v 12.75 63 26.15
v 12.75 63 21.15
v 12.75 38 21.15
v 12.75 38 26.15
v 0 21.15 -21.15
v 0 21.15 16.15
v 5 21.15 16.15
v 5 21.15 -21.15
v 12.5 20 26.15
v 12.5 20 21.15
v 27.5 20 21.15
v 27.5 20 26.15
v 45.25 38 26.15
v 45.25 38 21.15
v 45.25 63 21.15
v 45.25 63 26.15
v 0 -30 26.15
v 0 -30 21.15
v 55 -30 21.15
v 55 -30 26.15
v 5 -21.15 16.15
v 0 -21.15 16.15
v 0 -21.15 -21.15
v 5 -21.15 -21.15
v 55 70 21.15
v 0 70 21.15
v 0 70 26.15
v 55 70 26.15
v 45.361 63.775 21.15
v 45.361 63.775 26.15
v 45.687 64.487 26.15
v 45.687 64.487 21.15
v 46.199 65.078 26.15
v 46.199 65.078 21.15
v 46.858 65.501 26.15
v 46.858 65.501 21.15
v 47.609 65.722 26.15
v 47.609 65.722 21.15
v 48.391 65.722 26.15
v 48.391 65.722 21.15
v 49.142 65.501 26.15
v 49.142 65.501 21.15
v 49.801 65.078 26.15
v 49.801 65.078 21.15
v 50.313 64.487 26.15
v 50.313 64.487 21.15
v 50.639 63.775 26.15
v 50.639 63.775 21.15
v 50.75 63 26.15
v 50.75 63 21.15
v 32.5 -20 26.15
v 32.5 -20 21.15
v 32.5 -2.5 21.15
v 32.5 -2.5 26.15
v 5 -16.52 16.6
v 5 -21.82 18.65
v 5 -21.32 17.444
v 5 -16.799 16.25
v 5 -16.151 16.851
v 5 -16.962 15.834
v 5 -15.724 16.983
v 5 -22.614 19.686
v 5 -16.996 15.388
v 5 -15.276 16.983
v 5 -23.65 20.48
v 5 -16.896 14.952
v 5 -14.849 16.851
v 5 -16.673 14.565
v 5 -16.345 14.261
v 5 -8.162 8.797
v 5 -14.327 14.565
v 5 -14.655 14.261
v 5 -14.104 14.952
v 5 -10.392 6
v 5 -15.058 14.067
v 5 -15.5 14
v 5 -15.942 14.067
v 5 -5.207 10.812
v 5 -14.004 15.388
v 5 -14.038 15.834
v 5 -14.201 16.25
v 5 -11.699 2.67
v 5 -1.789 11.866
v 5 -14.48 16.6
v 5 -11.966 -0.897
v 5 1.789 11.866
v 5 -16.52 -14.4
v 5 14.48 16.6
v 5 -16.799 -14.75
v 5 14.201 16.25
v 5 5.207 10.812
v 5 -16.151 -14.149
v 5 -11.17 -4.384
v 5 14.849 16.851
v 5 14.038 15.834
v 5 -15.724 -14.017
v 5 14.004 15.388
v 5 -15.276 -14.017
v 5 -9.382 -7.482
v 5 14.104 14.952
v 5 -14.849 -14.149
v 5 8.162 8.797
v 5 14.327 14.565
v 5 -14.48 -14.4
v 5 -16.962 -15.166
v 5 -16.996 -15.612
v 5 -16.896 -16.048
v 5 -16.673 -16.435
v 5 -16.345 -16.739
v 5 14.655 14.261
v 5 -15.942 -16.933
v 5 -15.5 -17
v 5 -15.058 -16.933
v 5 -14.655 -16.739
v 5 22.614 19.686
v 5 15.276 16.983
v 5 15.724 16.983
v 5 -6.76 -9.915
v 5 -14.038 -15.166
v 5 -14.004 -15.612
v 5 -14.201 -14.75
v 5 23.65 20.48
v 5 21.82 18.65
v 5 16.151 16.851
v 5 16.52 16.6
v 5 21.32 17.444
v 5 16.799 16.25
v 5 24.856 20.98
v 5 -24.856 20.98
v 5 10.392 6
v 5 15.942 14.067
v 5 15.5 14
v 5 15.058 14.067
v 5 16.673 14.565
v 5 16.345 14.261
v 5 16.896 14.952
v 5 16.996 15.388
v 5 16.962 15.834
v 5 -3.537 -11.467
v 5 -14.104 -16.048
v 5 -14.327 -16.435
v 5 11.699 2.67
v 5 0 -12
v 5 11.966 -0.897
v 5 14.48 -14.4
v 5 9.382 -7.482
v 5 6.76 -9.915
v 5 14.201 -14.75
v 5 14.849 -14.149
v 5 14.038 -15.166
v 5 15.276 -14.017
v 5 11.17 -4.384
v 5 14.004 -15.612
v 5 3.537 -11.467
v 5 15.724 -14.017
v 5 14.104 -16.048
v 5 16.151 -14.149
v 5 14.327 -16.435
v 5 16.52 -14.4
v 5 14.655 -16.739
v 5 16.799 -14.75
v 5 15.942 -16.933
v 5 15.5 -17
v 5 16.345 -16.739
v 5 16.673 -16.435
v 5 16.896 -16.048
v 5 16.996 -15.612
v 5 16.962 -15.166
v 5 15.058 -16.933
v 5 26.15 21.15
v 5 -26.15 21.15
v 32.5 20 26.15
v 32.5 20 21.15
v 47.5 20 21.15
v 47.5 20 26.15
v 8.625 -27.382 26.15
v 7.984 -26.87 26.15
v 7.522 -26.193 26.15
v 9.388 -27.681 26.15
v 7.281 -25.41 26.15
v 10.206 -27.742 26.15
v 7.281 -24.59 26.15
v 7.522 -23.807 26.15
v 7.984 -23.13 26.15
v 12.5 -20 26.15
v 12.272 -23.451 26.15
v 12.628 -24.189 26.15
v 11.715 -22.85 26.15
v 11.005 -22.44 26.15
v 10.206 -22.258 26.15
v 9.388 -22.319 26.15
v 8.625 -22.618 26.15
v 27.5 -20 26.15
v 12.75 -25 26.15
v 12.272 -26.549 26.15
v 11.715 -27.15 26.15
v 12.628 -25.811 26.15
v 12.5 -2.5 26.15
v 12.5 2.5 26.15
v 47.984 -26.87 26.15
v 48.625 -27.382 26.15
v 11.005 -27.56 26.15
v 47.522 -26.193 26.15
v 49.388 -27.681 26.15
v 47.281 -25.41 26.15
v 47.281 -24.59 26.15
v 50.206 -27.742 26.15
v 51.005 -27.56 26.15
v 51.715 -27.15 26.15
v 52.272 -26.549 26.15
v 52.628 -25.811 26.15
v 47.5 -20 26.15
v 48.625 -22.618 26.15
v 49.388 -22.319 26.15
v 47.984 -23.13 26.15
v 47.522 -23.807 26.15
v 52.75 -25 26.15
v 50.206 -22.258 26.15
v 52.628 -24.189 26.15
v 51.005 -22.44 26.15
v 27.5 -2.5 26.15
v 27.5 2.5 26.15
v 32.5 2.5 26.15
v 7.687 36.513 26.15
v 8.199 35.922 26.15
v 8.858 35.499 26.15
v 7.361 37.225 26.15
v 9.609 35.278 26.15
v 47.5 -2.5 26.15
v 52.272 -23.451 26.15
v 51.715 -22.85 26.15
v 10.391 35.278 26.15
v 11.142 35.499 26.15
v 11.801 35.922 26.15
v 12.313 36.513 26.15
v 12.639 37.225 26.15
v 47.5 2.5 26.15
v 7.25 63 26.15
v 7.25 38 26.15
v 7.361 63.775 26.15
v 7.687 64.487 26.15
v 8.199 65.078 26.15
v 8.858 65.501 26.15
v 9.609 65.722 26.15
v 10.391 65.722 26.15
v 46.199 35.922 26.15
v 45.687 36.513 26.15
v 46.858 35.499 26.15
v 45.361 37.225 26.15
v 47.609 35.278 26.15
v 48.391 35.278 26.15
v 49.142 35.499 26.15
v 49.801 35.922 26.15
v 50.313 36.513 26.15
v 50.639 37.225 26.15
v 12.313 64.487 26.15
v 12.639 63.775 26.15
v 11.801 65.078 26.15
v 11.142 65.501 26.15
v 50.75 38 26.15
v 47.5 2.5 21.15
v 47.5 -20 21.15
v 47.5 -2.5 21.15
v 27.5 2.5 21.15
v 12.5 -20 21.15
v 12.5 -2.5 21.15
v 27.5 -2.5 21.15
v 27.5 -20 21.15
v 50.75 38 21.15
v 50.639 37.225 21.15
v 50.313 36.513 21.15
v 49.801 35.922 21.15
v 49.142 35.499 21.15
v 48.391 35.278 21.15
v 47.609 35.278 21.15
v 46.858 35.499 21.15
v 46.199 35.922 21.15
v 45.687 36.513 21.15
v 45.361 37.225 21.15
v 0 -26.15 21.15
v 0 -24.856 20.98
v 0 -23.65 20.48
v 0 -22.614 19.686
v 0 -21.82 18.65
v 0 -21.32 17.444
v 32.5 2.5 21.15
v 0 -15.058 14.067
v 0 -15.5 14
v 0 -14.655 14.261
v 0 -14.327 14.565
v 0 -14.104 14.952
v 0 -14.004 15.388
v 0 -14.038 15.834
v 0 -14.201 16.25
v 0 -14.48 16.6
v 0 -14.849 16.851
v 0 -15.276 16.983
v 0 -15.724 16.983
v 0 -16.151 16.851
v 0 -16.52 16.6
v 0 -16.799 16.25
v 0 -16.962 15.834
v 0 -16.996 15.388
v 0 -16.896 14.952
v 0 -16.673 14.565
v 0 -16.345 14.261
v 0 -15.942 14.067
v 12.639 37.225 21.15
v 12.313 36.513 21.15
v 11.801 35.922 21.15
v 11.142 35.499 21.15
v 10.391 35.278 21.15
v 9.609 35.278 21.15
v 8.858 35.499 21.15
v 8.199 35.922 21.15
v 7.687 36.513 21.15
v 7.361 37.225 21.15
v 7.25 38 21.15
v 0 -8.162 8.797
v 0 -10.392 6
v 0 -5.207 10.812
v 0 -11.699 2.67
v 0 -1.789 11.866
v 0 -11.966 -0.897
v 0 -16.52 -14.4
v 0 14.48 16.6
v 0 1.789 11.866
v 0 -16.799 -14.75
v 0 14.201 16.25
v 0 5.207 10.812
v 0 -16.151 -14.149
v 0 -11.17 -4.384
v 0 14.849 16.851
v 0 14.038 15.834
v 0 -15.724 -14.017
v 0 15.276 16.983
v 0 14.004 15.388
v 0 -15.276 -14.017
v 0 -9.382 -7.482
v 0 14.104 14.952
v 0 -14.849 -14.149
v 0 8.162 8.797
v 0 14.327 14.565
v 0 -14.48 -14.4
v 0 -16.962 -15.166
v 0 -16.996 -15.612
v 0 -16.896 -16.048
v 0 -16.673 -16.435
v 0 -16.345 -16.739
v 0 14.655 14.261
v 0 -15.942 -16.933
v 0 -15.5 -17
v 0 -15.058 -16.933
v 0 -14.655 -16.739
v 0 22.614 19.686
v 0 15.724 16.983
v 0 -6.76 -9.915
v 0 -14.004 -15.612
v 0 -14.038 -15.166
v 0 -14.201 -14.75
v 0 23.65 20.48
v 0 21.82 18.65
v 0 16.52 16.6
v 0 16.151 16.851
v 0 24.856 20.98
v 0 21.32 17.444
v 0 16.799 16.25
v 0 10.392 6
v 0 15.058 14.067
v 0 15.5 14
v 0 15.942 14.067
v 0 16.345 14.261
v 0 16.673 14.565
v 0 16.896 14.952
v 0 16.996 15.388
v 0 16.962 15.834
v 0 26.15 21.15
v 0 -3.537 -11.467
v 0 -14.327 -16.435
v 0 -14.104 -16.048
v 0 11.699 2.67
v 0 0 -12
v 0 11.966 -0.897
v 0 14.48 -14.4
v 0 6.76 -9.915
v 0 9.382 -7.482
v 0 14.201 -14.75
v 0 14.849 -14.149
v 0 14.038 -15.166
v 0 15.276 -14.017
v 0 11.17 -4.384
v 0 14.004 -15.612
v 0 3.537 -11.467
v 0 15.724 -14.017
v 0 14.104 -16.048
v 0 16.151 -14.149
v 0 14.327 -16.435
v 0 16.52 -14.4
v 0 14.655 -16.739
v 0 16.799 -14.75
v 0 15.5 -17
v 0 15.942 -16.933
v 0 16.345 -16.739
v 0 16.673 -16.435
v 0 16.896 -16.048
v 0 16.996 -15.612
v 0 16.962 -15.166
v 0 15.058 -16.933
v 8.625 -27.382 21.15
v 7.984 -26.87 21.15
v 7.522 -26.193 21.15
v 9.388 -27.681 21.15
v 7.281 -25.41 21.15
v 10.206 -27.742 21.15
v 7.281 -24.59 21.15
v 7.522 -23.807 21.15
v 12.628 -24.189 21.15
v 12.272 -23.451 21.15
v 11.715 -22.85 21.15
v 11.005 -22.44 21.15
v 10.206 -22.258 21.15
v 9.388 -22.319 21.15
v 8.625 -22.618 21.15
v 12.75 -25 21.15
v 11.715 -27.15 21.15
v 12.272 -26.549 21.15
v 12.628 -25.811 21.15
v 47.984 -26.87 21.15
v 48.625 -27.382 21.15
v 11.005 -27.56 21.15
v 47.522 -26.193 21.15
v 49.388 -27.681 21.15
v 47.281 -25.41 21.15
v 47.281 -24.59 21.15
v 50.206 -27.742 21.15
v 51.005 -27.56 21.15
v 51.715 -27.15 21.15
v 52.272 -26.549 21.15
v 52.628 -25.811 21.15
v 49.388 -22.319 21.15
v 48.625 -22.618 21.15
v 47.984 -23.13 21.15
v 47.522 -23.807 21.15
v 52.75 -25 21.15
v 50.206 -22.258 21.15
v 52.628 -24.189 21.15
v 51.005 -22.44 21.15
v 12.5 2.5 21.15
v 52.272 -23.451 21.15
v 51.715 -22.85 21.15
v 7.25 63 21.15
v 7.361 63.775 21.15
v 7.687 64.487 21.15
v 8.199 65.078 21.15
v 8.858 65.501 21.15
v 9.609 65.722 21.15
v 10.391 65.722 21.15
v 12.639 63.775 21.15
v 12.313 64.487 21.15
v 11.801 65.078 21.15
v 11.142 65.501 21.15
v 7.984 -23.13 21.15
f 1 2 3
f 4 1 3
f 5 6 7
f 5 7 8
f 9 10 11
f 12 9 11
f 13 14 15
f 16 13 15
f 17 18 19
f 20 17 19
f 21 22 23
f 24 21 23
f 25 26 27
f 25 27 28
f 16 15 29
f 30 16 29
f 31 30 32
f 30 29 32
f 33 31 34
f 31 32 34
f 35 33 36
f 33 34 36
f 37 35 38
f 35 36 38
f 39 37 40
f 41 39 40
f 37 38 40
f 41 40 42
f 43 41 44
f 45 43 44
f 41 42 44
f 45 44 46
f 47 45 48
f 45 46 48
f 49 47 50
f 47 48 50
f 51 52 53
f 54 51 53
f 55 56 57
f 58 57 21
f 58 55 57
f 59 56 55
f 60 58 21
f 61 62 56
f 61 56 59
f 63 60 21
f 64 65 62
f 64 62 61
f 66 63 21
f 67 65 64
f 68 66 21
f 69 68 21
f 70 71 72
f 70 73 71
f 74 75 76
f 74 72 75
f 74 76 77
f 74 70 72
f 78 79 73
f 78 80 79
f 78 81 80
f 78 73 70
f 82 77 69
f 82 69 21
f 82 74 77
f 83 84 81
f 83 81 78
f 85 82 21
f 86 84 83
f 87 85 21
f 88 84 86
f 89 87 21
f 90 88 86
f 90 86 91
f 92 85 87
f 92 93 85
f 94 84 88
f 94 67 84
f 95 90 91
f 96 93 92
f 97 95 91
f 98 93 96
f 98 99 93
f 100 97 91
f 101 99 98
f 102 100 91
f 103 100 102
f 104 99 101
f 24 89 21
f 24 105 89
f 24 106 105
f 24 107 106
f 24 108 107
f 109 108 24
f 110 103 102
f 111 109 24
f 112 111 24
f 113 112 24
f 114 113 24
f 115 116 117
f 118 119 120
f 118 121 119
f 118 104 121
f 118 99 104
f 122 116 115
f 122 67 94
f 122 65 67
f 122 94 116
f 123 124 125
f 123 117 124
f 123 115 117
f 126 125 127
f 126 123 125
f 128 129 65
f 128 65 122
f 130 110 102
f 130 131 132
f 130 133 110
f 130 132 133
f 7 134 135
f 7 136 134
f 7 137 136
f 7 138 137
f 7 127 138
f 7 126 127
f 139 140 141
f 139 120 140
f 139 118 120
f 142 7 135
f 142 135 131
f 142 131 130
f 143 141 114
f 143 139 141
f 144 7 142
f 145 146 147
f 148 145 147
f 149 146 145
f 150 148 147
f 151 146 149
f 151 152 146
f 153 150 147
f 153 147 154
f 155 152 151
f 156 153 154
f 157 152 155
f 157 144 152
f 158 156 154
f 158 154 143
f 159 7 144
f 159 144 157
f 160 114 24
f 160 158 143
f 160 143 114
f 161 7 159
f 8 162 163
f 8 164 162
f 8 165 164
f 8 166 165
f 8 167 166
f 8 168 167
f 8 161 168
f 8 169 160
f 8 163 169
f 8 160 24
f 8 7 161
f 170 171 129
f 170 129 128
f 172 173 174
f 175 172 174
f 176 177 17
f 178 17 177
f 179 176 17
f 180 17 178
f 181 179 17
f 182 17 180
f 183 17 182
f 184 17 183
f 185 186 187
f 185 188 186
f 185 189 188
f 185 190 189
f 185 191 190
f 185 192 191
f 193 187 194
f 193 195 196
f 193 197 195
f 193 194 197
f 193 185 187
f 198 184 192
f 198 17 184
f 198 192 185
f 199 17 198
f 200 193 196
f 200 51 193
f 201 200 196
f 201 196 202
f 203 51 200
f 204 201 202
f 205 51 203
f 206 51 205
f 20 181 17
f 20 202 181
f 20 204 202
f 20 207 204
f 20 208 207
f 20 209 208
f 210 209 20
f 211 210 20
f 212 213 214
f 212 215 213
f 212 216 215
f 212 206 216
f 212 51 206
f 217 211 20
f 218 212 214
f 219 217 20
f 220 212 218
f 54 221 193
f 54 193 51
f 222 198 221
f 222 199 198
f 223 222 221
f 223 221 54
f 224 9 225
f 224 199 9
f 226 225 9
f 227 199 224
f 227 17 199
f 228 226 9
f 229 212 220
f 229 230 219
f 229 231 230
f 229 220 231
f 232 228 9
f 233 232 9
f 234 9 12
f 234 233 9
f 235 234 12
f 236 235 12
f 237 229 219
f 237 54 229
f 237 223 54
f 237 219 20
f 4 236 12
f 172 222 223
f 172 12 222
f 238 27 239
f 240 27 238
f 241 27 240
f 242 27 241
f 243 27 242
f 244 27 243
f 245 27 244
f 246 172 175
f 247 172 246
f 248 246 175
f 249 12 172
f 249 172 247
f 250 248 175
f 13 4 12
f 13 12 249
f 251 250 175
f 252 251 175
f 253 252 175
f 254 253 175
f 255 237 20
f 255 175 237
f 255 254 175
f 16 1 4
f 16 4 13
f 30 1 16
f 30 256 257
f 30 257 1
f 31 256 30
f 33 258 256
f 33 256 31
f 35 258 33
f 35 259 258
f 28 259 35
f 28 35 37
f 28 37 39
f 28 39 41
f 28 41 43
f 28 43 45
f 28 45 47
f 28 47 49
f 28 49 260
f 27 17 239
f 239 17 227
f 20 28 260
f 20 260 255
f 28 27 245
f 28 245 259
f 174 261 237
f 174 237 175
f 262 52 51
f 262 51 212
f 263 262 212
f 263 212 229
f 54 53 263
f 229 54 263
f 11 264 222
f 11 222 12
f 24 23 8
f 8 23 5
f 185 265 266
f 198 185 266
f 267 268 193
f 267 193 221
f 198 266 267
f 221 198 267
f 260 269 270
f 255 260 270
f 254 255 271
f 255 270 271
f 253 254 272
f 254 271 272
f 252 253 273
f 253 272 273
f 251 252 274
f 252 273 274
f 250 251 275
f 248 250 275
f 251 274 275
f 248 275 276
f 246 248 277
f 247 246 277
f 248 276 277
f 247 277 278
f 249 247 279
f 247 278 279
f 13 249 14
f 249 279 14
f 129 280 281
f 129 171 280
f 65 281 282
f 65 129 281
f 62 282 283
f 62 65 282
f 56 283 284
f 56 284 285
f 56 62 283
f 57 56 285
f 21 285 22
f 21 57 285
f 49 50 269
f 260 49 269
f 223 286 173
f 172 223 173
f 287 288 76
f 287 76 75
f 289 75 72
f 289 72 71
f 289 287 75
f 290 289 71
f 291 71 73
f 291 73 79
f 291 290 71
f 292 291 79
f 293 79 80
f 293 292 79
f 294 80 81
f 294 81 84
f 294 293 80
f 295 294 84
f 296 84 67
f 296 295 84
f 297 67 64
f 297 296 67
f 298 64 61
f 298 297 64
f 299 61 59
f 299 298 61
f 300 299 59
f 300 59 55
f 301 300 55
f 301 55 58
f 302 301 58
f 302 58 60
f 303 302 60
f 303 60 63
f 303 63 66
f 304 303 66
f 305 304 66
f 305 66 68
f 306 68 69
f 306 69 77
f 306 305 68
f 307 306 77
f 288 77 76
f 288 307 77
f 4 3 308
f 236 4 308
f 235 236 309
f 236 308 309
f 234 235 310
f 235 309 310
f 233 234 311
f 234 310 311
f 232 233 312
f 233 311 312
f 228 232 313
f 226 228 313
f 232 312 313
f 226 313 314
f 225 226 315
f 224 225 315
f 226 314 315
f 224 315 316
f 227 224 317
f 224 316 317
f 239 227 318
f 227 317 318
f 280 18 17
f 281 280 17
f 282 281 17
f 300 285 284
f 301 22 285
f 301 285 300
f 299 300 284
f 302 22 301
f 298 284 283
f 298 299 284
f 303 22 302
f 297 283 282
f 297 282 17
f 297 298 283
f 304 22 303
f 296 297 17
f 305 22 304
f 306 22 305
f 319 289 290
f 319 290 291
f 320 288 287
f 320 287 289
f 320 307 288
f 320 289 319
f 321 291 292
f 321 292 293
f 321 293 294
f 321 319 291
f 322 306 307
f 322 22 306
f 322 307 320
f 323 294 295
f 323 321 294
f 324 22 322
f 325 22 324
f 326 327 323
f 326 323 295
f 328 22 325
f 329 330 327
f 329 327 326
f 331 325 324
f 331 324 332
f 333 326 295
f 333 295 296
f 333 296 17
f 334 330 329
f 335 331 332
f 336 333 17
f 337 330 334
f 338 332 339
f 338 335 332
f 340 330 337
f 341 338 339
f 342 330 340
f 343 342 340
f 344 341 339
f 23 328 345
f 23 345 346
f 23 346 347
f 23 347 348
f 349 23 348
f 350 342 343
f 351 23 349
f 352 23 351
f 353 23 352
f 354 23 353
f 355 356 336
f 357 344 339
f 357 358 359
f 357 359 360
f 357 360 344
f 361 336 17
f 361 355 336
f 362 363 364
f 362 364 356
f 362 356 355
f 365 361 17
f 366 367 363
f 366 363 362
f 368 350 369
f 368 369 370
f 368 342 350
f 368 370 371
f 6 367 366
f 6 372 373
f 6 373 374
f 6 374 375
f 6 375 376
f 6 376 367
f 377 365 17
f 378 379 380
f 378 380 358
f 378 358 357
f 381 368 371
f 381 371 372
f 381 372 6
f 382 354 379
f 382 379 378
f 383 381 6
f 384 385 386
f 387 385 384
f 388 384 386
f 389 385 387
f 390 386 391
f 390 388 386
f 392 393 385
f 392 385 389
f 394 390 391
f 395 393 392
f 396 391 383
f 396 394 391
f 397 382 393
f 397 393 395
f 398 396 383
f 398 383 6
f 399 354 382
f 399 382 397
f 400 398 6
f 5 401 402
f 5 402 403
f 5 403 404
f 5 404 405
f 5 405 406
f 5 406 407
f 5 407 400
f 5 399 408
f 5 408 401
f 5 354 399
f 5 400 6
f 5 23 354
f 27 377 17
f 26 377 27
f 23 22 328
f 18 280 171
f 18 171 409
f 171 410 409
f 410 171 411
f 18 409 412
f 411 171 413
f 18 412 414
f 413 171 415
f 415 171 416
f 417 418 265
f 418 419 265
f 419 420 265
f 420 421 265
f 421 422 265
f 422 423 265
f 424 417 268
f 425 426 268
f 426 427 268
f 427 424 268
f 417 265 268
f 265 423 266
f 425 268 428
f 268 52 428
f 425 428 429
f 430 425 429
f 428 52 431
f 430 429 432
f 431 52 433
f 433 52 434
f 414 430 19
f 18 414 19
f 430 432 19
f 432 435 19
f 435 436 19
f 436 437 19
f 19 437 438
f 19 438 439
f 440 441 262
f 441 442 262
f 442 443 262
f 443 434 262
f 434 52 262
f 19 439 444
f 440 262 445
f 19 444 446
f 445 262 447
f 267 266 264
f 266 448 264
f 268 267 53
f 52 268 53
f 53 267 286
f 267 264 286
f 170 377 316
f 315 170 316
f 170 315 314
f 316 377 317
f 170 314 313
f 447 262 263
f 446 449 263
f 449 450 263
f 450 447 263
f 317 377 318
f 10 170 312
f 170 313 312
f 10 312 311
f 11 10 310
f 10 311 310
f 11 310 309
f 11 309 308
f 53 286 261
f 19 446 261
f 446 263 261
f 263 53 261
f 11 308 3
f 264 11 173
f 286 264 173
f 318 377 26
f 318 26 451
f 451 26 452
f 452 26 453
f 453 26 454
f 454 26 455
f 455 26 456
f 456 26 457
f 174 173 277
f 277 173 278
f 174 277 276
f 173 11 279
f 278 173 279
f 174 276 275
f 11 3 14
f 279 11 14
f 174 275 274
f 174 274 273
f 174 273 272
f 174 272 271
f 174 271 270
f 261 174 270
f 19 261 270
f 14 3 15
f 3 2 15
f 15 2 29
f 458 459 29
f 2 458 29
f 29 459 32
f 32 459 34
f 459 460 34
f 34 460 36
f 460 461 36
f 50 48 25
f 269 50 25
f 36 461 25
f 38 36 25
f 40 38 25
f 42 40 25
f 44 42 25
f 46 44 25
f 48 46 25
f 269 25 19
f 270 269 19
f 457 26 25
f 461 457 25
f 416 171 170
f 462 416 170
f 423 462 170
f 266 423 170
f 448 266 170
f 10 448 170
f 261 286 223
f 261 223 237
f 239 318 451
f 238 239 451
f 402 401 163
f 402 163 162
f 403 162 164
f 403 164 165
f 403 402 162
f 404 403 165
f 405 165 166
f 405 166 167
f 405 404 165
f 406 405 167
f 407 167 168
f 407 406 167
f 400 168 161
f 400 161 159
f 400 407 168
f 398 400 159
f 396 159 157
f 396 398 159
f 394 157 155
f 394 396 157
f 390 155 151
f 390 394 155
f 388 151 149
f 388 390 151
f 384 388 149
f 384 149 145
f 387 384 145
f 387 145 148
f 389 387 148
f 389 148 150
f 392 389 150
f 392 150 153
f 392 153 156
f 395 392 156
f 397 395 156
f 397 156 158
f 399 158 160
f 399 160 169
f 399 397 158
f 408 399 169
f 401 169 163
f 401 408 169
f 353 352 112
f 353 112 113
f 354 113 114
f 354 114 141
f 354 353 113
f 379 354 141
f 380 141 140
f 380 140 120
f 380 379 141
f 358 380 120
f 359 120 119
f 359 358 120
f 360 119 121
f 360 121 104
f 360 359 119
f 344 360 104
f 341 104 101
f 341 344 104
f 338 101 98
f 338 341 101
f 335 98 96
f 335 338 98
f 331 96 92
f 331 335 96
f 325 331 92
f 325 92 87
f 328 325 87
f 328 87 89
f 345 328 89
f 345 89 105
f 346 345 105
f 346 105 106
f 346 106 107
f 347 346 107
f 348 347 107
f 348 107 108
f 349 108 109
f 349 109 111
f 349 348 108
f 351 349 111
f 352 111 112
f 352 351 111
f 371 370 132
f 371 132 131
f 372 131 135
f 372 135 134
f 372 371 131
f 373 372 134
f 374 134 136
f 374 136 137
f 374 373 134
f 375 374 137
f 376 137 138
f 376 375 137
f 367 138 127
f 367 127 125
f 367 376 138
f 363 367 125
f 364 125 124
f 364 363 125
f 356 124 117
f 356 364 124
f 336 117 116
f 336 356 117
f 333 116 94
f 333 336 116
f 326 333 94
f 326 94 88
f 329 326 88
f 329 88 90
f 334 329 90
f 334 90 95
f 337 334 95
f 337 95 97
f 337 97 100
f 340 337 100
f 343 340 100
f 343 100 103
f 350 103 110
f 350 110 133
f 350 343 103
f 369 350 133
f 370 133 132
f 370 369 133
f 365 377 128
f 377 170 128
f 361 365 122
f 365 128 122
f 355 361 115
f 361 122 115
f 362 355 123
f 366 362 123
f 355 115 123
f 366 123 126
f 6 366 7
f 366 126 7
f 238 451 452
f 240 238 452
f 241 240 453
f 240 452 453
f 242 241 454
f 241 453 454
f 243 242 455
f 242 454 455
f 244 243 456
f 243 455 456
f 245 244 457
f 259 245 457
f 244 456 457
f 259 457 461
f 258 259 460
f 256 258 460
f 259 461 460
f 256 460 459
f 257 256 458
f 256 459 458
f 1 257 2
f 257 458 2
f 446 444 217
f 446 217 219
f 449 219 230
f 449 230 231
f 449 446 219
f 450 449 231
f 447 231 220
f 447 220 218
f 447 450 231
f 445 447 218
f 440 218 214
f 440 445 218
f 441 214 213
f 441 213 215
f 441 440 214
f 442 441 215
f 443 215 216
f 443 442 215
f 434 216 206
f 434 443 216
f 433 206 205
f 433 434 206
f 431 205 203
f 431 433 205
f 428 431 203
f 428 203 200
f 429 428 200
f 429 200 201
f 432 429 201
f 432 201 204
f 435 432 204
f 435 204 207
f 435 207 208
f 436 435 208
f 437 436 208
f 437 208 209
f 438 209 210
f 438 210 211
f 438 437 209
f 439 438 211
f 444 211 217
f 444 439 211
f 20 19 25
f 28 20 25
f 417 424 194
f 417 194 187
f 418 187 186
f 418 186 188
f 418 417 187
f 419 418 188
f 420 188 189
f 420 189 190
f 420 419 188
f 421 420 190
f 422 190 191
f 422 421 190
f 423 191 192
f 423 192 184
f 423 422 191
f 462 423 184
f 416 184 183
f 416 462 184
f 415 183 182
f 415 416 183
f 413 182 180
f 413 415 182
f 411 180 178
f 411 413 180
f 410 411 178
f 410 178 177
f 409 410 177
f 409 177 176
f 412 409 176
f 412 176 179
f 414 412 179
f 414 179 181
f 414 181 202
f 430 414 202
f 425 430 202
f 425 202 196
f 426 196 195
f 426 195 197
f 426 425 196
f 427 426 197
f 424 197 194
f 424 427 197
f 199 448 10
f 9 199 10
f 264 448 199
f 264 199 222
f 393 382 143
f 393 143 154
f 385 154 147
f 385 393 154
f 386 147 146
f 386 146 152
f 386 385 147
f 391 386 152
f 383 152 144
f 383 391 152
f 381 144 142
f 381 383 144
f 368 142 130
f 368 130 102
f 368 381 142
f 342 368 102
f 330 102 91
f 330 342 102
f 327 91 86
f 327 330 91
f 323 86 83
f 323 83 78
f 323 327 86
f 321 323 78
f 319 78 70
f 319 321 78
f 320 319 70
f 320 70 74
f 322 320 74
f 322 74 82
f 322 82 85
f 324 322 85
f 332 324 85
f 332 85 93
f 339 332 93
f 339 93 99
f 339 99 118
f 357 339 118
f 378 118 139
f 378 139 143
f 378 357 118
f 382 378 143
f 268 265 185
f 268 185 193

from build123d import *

# Parameters (mm, degrees)
SKETCH2_W           = 42.3
SKETCH2_H           = 42.3
SKETCH2_R           = 1.5
SKETCH2_R_2         = 12
BOSS_EXTRUDE1_DEPTH = 5
SKETCH3_W           = 55
SKETCH3_H           = 100
SKETCH3_R           = 2.75
SKETCH3_W_2         = 15
SKETCH3_H_2         = 17.5
BOSS_EXTRUDE2_DEPTH = 5
FILLET1_R           = 5


with BuildPart() as part:
    # Sketch2 → Boss-Extrude1 (new body)
    with BuildSketch(Plane(origin=(0, 0, 0), x_dir=(0, 0, -1), z_dir=(1, 0, 0))):
        Rectangle(SKETCH2_W, SKETCH2_H)
        with Locations((-15.5, 15.5)):
            Circle(SKETCH2_R, mode=Mode.SUBTRACT)
        with Locations((15.5, 15.5)):
            Circle(SKETCH2_R, mode=Mode.SUBTRACT)
        with Locations((15.5, -15.5)):
            Circle(SKETCH2_R, mode=Mode.SUBTRACT)
        with Locations((-15.5, -15.5)):
            Circle(SKETCH2_R, mode=Mode.SUBTRACT)
        Circle(SKETCH2_R_2, mode=Mode.SUBTRACT)
    extrude(amount=BOSS_EXTRUDE1_DEPTH)

    # Sketch3 → Boss-Extrude2 (add)
    with BuildSketch(Plane.XY.offset(21.15)):
        with Locations((27.5, 20)):
            Rectangle(SKETCH3_W, SKETCH3_H)
        with Locations((50, -25)):
            Circle(SKETCH3_R, mode=Mode.SUBTRACT)
        with Locations((10, -25)):
            Circle(SKETCH3_R, mode=Mode.SUBTRACT)
        with Locations((20, 11.25)):
            Rectangle(SKETCH3_W_2, SKETCH3_H_2, mode=Mode.SUBTRACT)
        with Locations((40, 11.25)):
            Rectangle(SKETCH3_W_2, SKETCH3_H_2, mode=Mode.SUBTRACT)
        with Locations((40, -11.25)):
            Rectangle(SKETCH3_W_2, SKETCH3_H_2, mode=Mode.SUBTRACT)
        with Locations((20, -11.25)):
            Rectangle(SKETCH3_W_2, SKETCH3_H_2, mode=Mode.SUBTRACT)
        with BuildLine():
            Line((50.75, 63), (50.75, 38))
            ThreePointArc((50.75, 38), (48, 35.25), (45.25, 38))
            Line((45.25, 38), (45.25, 63))
            ThreePointArc((45.25, 63), (48, 65.75), (50.75, 63))
        make_face(mode=Mode.SUBTRACT)
        with BuildLine():
            Line((12.75, 63), (12.75, 38))
            ThreePointArc((12.75, 38), (10, 35.25), (7.25, 38))
            Line((7.25, 38), (7.25, 63))
            ThreePointArc((7.25, 63), (10, 65.75), (12.75, 63))
        make_face(mode=Mode.SUBTRACT)
    extrude(amount=BOSS_EXTRUDE2_DEPTH)

    # Fillet1
    fillet1_edges = [part.edges().sort_by_distance(p)[0] for p in [
        (2.5, -21.15, 21.15),
        (2.5, 21.15, 21.15),
    ]]
    fillet(fillet1_edges, radius=FILLET1_R)


solid = part.part
